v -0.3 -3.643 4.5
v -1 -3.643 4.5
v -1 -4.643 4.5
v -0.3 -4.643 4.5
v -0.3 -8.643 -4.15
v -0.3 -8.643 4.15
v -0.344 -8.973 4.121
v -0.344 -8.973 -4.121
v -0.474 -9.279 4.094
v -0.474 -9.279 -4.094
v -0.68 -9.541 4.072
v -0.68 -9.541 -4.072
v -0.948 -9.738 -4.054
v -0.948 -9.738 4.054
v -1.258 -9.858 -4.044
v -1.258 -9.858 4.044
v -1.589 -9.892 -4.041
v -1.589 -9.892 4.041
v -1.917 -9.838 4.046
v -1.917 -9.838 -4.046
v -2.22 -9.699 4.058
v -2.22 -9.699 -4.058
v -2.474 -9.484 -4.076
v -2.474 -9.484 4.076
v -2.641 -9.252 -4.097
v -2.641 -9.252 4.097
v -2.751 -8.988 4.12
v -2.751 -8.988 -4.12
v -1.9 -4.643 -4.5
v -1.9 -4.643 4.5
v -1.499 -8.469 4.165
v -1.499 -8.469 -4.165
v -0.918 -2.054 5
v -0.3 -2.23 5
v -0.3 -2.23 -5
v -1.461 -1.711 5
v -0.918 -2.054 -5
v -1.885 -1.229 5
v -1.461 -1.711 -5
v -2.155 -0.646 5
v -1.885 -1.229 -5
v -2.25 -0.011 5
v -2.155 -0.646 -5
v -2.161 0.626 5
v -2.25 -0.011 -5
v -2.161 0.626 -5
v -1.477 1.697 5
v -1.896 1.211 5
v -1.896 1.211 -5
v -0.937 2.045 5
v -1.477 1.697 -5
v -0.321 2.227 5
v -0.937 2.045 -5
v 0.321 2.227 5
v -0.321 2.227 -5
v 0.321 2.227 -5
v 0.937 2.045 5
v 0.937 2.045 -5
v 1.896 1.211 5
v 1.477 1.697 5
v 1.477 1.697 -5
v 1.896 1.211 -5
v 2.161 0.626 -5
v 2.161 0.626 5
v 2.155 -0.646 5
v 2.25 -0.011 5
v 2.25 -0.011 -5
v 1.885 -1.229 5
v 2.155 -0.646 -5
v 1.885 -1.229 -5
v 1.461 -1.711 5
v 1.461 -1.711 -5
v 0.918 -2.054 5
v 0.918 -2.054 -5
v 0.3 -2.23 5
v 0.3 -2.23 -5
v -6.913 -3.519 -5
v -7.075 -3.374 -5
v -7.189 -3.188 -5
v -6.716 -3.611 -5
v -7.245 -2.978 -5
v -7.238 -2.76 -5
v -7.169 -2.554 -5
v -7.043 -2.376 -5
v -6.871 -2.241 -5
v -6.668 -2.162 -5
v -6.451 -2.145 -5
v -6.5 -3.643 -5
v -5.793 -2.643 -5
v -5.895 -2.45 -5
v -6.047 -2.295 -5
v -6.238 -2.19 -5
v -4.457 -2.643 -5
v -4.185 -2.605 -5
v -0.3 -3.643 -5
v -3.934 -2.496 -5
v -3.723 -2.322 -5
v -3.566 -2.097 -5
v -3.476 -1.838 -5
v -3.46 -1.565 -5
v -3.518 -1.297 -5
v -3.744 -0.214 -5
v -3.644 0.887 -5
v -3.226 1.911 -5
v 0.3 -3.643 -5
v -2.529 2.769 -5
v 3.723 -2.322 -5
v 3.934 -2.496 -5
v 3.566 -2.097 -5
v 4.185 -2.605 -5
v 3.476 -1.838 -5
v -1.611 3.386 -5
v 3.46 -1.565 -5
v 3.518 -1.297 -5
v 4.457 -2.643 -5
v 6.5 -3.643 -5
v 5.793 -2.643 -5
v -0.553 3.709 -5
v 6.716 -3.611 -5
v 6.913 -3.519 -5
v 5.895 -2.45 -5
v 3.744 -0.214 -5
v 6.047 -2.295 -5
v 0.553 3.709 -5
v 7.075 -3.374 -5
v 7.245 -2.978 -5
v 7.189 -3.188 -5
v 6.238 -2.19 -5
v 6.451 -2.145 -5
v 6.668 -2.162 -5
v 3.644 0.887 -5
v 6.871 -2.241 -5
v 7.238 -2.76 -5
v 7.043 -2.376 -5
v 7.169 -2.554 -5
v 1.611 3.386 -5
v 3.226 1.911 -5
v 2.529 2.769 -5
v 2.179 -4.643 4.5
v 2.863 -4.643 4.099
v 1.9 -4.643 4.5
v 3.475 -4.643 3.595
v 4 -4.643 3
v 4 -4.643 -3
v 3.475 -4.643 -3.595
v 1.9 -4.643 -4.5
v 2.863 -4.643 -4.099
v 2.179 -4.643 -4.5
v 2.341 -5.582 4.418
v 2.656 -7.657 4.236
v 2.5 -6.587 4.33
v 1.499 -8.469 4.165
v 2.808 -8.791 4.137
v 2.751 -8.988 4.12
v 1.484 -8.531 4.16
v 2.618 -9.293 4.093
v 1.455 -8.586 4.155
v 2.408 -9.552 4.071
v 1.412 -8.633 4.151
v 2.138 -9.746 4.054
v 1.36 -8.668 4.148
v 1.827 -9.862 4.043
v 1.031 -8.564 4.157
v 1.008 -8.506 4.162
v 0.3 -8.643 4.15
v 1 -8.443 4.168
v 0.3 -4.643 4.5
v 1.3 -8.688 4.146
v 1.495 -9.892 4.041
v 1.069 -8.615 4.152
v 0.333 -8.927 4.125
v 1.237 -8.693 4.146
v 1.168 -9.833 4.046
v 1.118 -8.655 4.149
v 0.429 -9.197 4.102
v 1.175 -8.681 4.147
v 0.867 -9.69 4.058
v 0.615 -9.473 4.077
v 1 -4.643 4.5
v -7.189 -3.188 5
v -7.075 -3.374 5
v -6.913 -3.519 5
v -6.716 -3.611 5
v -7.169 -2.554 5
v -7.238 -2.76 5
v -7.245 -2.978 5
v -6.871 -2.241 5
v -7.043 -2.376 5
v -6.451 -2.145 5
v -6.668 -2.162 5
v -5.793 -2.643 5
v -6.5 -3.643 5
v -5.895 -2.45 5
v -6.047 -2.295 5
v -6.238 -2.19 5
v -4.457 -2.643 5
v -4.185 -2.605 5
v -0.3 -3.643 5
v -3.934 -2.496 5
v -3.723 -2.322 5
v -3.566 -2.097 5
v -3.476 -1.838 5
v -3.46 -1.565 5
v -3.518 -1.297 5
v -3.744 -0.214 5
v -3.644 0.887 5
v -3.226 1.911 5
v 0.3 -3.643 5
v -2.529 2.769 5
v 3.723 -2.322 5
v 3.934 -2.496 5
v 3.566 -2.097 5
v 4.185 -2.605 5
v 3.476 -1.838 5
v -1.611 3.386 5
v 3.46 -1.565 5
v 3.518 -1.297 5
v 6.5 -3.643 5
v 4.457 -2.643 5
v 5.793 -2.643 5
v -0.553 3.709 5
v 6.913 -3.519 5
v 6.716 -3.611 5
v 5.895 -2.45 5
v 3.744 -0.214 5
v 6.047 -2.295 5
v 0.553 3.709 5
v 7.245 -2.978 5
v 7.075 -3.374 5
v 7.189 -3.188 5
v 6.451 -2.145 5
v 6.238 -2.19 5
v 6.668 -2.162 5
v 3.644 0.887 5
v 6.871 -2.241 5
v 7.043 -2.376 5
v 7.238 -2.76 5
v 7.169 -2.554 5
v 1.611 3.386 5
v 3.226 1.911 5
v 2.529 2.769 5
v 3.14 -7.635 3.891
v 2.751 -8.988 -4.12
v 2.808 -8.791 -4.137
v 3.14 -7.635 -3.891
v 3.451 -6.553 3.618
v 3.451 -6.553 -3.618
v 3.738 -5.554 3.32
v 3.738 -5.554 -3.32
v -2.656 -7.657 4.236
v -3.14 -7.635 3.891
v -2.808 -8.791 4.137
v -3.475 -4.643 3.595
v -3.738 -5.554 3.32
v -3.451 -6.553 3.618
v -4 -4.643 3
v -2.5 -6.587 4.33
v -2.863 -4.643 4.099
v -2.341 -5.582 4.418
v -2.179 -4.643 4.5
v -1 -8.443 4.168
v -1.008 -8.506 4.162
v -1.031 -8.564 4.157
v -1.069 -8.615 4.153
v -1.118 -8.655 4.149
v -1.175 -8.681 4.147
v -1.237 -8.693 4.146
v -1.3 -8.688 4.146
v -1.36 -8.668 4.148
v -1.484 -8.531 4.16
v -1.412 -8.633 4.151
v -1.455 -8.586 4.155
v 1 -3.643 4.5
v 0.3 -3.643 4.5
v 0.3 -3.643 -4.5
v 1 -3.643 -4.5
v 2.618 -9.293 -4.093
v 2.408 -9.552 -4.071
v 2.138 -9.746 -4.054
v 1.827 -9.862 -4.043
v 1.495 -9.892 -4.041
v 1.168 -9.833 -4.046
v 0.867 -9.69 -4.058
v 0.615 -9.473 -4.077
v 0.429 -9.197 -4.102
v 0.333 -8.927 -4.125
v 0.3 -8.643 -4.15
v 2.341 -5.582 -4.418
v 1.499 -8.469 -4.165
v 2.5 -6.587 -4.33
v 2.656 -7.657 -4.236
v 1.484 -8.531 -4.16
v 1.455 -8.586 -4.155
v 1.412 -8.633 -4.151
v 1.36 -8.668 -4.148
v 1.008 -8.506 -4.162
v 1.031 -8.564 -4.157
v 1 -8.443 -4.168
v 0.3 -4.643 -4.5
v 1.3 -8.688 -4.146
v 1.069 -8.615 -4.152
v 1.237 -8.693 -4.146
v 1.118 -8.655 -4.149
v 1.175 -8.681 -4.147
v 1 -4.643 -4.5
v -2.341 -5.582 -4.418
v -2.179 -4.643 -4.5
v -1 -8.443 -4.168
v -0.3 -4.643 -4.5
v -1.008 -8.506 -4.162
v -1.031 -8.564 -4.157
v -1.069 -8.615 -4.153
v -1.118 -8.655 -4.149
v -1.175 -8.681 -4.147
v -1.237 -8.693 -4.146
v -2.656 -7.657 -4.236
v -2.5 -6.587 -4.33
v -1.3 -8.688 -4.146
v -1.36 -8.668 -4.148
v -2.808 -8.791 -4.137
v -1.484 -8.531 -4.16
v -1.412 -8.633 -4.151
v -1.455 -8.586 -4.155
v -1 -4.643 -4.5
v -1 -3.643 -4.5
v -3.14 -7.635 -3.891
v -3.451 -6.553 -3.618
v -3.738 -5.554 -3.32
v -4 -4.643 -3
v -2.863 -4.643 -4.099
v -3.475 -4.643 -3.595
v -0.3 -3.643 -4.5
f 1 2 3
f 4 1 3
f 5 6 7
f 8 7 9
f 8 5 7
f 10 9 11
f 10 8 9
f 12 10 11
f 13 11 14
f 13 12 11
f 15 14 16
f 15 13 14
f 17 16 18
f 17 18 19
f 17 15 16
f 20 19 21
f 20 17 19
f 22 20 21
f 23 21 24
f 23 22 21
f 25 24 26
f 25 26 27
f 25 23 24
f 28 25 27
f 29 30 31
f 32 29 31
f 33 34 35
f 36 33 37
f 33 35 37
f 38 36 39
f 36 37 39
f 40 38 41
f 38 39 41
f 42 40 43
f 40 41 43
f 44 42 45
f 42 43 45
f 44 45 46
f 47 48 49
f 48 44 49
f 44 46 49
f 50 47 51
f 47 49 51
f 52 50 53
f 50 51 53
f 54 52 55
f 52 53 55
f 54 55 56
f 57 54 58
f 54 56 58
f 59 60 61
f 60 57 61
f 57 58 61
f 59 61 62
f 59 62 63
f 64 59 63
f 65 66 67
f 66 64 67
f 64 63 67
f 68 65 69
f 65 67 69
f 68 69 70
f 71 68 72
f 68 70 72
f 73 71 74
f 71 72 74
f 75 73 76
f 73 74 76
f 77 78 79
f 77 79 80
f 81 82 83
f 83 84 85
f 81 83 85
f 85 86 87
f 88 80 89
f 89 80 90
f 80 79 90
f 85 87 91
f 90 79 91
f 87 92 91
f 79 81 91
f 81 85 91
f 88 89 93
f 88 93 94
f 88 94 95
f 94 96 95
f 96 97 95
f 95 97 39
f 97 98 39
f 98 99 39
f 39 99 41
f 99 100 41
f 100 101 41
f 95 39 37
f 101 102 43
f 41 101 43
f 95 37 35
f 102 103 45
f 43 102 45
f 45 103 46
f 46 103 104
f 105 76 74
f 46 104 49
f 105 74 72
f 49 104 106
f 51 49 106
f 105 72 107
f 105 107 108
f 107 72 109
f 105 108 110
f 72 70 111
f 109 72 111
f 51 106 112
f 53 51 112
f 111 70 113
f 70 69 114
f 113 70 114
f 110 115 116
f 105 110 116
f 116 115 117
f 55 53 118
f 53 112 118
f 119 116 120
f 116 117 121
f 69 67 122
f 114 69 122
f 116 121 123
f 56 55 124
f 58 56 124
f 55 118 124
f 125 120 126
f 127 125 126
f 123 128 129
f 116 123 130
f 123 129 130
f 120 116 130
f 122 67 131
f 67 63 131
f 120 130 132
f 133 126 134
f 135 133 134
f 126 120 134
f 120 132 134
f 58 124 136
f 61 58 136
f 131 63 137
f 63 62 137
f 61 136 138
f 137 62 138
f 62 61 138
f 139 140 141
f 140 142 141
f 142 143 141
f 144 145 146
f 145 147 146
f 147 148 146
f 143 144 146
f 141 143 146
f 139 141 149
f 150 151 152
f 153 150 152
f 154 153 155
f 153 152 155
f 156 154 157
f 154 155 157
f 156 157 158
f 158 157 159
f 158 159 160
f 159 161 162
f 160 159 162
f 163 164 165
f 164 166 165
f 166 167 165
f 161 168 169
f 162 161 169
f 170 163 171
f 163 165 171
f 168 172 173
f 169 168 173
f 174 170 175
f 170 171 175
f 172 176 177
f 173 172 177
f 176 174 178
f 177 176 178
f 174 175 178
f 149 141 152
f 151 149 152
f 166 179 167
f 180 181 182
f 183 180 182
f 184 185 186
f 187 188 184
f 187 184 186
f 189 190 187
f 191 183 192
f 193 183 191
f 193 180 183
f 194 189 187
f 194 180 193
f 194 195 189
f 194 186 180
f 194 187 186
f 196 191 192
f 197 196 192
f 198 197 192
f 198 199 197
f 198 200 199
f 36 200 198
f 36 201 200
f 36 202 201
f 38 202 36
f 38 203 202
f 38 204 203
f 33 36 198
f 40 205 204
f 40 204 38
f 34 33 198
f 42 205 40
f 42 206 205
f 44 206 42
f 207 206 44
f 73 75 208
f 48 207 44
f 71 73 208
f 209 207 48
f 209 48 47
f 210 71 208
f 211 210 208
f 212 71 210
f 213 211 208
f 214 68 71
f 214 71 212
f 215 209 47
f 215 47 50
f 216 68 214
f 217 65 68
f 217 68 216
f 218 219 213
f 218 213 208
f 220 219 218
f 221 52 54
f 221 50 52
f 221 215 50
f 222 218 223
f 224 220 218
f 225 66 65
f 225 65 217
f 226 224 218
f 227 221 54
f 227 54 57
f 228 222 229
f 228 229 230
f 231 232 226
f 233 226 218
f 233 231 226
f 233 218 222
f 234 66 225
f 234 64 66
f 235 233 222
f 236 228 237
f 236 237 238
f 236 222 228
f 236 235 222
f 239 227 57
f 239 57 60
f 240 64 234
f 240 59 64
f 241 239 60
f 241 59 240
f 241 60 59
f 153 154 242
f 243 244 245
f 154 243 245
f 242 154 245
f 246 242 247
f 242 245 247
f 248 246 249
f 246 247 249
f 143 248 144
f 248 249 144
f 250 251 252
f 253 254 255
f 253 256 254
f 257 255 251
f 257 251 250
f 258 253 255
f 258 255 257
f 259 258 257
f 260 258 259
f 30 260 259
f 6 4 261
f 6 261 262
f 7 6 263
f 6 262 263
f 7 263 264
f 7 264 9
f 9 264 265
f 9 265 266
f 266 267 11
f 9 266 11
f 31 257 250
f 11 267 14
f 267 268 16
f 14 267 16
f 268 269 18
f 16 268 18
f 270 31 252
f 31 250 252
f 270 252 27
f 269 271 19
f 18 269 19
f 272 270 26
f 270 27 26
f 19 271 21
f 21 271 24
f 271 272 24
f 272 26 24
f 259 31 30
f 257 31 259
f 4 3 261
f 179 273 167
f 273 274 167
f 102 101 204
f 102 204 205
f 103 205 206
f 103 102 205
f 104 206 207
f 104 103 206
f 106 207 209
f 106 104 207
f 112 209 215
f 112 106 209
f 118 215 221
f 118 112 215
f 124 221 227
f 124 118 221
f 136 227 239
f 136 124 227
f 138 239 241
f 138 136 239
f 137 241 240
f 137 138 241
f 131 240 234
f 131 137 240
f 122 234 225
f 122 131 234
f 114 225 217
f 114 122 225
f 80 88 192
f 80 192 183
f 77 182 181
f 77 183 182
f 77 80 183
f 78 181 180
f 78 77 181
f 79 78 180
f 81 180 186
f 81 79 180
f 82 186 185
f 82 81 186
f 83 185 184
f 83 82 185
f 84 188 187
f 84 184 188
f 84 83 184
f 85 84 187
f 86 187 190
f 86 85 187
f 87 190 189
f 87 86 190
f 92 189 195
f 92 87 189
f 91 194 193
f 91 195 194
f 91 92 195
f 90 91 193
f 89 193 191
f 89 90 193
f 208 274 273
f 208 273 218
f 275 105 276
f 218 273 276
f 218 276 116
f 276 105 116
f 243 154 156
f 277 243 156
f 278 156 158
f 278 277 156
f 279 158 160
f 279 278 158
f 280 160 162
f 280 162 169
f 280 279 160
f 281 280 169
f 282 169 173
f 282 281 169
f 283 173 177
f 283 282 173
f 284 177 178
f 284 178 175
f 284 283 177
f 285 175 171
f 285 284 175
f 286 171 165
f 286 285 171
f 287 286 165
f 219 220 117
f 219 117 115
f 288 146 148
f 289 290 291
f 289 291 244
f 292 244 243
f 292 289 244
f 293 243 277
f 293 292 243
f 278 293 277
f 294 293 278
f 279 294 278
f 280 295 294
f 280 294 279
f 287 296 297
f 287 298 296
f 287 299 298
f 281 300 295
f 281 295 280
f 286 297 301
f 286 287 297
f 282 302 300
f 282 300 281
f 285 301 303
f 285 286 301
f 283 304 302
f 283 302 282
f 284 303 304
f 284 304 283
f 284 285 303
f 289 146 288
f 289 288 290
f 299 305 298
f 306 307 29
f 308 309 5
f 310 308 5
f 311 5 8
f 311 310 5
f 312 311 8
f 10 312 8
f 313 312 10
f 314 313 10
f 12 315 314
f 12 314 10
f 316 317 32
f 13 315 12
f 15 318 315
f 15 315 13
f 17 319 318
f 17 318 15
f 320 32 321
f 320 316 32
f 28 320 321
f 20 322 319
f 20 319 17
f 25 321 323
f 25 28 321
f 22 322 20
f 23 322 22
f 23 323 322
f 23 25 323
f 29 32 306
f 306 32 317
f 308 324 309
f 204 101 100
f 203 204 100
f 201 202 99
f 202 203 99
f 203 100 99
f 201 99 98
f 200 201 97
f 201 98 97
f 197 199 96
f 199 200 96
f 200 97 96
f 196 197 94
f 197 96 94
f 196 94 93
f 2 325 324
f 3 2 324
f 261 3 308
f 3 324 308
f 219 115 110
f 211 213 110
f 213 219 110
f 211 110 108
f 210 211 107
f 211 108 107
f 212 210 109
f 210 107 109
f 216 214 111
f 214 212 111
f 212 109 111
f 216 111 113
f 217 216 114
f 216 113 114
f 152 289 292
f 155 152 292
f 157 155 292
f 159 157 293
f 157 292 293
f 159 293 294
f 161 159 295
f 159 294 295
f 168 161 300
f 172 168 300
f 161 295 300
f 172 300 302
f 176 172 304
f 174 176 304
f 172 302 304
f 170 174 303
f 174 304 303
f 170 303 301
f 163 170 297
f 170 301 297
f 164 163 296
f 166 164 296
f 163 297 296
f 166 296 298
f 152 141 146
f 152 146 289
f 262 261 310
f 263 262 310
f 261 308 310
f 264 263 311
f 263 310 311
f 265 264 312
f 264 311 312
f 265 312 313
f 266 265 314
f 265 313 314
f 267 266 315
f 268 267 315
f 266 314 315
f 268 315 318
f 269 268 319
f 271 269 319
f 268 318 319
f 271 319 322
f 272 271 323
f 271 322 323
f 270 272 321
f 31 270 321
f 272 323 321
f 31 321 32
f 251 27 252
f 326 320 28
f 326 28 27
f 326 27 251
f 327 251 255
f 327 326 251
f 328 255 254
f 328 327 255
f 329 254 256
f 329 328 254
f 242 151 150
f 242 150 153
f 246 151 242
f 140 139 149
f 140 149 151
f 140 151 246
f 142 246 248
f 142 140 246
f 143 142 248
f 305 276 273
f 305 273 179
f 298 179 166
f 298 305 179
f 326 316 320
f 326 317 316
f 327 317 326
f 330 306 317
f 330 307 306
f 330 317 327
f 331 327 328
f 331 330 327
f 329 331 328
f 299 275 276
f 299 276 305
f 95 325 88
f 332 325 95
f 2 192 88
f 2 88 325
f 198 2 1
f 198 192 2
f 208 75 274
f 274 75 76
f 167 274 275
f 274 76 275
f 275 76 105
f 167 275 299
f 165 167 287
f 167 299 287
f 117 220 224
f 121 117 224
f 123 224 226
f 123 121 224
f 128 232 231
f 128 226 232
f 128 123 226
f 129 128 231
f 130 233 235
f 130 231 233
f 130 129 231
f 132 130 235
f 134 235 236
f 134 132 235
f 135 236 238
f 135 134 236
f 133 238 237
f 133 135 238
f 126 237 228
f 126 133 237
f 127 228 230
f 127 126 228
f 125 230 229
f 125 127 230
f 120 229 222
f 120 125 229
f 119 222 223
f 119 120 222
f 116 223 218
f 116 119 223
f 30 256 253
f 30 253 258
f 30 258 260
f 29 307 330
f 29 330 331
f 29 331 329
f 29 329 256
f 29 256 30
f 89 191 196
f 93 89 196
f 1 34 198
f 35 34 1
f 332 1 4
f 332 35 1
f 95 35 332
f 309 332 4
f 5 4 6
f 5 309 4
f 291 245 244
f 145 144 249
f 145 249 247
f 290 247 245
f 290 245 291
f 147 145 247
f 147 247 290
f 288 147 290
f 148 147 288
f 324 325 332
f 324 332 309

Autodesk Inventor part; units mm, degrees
ref_plane "YZ Plane" through (0, 0, 0) normal (1, 0, 0) x (0, 1, 0)
ref_plane "XZ Plane" through (0, 0, 0) normal (0, 1, 0) x (-1, 0, 0)
ref_plane "XY Plane" through (0, 0, 0) normal (0, 0, 1) x (1, 0, 0)
sketch "Sketch1" plane through (0, 0, 0) normal (0, 0, 1) x (1, 0, 0)
  circle A0 centre (0, 0) radius 2.25
  arc A1 (-5.7929, -2.643) -> (-6.5, -3.643) centre (-6.5, -2.893) ccw
  arc A2 (6.5, -3.643) -> (5.7929, -2.643) centre (6.5, -2.893) ccw
  line L0 (-5.7929, -2.643) -> (-4.4568, -2.643)
  line L1 (5.7929, -2.643) -> (4.4568, -2.643)
  arc A3 (3.5185, -1.2971) -> (-3.5185, -1.2971) centre (0, 0) ccw
  arc A4 (-4.4568, -2.643) -> (-3.5185, -1.2971) centre (-4.4568, -1.643) ccw
  arc A5 (3.5185, -1.2971) -> (4.4568, -2.643) centre (4.4568, -1.643) ccw
  line L2 (-0.3, -2.2299) -> (-0.3, -8.643)
  line L3 (0.3, -2.2299) -> (0.3, -3.643)
  arc A6 (-2.7514, -8.9882) -> (-0.3, -8.643) centre (-1.55, -8.643) ccw
  line L4 (-2.7514, -8.9882) -> (-4, -4.643)
  line L5 (-4, -4.643) -> (-1.9, -4.643)
  arc A7 (-1.4986, -8.4691) -> (-1, -8.443) centre (-1.25, -8.443) ccw
  line L6 (-1.9, -4.643) -> (-1.4986, -8.4691)
  line L7 (-1, -3.643) -> (-1, -8.443)
  line L8 (-12.8733, -3.643) -> (-1, -3.643)
  line L9 (1, -3.643) -> (16.2885, -3.643)
  line L10 (0, 6.5107) -> (0, -12.8141) projected
  line L11 (0.3, -2.2299) -> (0.3, -8.643)
  arc A8 (0.3, -8.643) -> (2.7514, -8.9882) centre (1.55, -8.643) ccw
  line L12 (2.7514, -8.9882) -> (4, -4.643)
  line L13 (4, -4.643) -> (1.9, -4.643)
  arc A9 (1, -8.443) -> (1.4986, -8.4691) centre (1.25, -8.443) ccw
  line L14 (1.9, -4.643) -> (1.4986, -8.4691)
  line L15 (1, -3.643) -> (1, -8.443)
  dimension "d0" = 4.5
  dimension "d5" = 1.5
  dimension "d6" = 1.5
  dimension "d7" = 6.5
  dimension "d8" = 6.5
  dimension "d9" = 3.75
  dimension "d10" = 1
  dimension "d11" = 0.6
  dimension "d12" = 0.3
  dimension "d13" = 0.5
  dimension "d14" = 2.5
  dimension "d15" = 4
  dimension "d17" = 2.1
  dimension "d18" = 0.2
  dimension "d19" = 0.7
  dimension "d21" = 3.643
  dimension "d22" = 1
  dimension "d23" = 1
  dimension "d24" = 5
  dimension "d25" = 1
extrude "Extrusion1" add sketch "Sketch1" along normal mid plane 10 contours A0 L10 A3 A5 L1 A2 L9 L15 A9 L14 L13 L12 A8 L11 L3 | A0 L2 A6 L4 L5 L6 A7 L7 L8 A1 L0 A4 A3 L10
sketch "Sketch2" plane through (1, -3.643, 5) normal (0, -1, 0) x (1, 0, 0)
  circle A0 centre (-1, -5) radius 10
  circle A1 centre (-1, -5) radius 5
  dimension "d28" = 10
  dimension "d29" = 5
extrude "Extrusion2" cut sketch "Sketch2" along normal through all
sketch "Sketch3" plane through (0, 0, 0) normal (1, 0, 0) x (0, 1, 0)
  line L0 (-3.643, 5) -> (-3.643, 4.991) projected
  line L1 (-3.643, -5) -> (-3.643, 5) projected
  line L2 (-3.643, -4.991) -> (-3.643, -5) projected
  line L3 (-3.643, -4.899) -> (-3.643, -4.991) projected
  line L4 (-3.643, -4.899) -> (-3.643, 4.899) projected
  line L5 (-3.643, 4.991) -> (-3.643, 4.899) projected
  line L6 (-3.643, 5) -> (-3.643, 4.5)
  line L7 (-11.643, 3.8876) -> (-11.643, 6)
  line L8 (-11.643, 6) -> (-3.643, 6)
  line L9 (-3.643, 6) -> (-3.643, 5)
  line L10 (-3.643, 4.5) -> (-4.643, 4.5)
  line L11 (-4.643, 4.5) -> (-11.643, 3.8876)
  line L12 (-13.9716, 0) -> (2.3286, 0) projected
  line L13 (-3.643, -5) -> (-3.643, -4.991)
  line L14 (-3.643, -4.991) -> (-3.643, -4.899)
  line L15 (-3.643, -5) -> (-3.643, -4.5)
  line L16 (-11.643, -3.8876) -> (-11.643, -6)
  line L17 (-11.643, -6) -> (-3.643, -6)
  line L18 (-3.643, -6) -> (-3.643, -5)
  line L19 (-3.643, -4.5) -> (-4.643, -4.5)
  line L20 (-4.643, -4.5) -> (-11.643, -3.8876)
  point P0 (0, 0)
  dimension "d32" = 1
  dimension "d33" = 5
  dimension "d34" = 0.5
  dimension "d35" = 1
  dimension "d36" = 8
extrude "Extrusion3" cut sketch "Sketch3" along normal through all both and the other way through all
equation "\"d6\" = d5"
equation "\"d8\" = d7"
equation "\"d12\" = 0.5 * d11"
equation "\"d4\" = d3"
equation "\"d3\" = 1"
properties part number "202-15" material "ABS Plastic"
